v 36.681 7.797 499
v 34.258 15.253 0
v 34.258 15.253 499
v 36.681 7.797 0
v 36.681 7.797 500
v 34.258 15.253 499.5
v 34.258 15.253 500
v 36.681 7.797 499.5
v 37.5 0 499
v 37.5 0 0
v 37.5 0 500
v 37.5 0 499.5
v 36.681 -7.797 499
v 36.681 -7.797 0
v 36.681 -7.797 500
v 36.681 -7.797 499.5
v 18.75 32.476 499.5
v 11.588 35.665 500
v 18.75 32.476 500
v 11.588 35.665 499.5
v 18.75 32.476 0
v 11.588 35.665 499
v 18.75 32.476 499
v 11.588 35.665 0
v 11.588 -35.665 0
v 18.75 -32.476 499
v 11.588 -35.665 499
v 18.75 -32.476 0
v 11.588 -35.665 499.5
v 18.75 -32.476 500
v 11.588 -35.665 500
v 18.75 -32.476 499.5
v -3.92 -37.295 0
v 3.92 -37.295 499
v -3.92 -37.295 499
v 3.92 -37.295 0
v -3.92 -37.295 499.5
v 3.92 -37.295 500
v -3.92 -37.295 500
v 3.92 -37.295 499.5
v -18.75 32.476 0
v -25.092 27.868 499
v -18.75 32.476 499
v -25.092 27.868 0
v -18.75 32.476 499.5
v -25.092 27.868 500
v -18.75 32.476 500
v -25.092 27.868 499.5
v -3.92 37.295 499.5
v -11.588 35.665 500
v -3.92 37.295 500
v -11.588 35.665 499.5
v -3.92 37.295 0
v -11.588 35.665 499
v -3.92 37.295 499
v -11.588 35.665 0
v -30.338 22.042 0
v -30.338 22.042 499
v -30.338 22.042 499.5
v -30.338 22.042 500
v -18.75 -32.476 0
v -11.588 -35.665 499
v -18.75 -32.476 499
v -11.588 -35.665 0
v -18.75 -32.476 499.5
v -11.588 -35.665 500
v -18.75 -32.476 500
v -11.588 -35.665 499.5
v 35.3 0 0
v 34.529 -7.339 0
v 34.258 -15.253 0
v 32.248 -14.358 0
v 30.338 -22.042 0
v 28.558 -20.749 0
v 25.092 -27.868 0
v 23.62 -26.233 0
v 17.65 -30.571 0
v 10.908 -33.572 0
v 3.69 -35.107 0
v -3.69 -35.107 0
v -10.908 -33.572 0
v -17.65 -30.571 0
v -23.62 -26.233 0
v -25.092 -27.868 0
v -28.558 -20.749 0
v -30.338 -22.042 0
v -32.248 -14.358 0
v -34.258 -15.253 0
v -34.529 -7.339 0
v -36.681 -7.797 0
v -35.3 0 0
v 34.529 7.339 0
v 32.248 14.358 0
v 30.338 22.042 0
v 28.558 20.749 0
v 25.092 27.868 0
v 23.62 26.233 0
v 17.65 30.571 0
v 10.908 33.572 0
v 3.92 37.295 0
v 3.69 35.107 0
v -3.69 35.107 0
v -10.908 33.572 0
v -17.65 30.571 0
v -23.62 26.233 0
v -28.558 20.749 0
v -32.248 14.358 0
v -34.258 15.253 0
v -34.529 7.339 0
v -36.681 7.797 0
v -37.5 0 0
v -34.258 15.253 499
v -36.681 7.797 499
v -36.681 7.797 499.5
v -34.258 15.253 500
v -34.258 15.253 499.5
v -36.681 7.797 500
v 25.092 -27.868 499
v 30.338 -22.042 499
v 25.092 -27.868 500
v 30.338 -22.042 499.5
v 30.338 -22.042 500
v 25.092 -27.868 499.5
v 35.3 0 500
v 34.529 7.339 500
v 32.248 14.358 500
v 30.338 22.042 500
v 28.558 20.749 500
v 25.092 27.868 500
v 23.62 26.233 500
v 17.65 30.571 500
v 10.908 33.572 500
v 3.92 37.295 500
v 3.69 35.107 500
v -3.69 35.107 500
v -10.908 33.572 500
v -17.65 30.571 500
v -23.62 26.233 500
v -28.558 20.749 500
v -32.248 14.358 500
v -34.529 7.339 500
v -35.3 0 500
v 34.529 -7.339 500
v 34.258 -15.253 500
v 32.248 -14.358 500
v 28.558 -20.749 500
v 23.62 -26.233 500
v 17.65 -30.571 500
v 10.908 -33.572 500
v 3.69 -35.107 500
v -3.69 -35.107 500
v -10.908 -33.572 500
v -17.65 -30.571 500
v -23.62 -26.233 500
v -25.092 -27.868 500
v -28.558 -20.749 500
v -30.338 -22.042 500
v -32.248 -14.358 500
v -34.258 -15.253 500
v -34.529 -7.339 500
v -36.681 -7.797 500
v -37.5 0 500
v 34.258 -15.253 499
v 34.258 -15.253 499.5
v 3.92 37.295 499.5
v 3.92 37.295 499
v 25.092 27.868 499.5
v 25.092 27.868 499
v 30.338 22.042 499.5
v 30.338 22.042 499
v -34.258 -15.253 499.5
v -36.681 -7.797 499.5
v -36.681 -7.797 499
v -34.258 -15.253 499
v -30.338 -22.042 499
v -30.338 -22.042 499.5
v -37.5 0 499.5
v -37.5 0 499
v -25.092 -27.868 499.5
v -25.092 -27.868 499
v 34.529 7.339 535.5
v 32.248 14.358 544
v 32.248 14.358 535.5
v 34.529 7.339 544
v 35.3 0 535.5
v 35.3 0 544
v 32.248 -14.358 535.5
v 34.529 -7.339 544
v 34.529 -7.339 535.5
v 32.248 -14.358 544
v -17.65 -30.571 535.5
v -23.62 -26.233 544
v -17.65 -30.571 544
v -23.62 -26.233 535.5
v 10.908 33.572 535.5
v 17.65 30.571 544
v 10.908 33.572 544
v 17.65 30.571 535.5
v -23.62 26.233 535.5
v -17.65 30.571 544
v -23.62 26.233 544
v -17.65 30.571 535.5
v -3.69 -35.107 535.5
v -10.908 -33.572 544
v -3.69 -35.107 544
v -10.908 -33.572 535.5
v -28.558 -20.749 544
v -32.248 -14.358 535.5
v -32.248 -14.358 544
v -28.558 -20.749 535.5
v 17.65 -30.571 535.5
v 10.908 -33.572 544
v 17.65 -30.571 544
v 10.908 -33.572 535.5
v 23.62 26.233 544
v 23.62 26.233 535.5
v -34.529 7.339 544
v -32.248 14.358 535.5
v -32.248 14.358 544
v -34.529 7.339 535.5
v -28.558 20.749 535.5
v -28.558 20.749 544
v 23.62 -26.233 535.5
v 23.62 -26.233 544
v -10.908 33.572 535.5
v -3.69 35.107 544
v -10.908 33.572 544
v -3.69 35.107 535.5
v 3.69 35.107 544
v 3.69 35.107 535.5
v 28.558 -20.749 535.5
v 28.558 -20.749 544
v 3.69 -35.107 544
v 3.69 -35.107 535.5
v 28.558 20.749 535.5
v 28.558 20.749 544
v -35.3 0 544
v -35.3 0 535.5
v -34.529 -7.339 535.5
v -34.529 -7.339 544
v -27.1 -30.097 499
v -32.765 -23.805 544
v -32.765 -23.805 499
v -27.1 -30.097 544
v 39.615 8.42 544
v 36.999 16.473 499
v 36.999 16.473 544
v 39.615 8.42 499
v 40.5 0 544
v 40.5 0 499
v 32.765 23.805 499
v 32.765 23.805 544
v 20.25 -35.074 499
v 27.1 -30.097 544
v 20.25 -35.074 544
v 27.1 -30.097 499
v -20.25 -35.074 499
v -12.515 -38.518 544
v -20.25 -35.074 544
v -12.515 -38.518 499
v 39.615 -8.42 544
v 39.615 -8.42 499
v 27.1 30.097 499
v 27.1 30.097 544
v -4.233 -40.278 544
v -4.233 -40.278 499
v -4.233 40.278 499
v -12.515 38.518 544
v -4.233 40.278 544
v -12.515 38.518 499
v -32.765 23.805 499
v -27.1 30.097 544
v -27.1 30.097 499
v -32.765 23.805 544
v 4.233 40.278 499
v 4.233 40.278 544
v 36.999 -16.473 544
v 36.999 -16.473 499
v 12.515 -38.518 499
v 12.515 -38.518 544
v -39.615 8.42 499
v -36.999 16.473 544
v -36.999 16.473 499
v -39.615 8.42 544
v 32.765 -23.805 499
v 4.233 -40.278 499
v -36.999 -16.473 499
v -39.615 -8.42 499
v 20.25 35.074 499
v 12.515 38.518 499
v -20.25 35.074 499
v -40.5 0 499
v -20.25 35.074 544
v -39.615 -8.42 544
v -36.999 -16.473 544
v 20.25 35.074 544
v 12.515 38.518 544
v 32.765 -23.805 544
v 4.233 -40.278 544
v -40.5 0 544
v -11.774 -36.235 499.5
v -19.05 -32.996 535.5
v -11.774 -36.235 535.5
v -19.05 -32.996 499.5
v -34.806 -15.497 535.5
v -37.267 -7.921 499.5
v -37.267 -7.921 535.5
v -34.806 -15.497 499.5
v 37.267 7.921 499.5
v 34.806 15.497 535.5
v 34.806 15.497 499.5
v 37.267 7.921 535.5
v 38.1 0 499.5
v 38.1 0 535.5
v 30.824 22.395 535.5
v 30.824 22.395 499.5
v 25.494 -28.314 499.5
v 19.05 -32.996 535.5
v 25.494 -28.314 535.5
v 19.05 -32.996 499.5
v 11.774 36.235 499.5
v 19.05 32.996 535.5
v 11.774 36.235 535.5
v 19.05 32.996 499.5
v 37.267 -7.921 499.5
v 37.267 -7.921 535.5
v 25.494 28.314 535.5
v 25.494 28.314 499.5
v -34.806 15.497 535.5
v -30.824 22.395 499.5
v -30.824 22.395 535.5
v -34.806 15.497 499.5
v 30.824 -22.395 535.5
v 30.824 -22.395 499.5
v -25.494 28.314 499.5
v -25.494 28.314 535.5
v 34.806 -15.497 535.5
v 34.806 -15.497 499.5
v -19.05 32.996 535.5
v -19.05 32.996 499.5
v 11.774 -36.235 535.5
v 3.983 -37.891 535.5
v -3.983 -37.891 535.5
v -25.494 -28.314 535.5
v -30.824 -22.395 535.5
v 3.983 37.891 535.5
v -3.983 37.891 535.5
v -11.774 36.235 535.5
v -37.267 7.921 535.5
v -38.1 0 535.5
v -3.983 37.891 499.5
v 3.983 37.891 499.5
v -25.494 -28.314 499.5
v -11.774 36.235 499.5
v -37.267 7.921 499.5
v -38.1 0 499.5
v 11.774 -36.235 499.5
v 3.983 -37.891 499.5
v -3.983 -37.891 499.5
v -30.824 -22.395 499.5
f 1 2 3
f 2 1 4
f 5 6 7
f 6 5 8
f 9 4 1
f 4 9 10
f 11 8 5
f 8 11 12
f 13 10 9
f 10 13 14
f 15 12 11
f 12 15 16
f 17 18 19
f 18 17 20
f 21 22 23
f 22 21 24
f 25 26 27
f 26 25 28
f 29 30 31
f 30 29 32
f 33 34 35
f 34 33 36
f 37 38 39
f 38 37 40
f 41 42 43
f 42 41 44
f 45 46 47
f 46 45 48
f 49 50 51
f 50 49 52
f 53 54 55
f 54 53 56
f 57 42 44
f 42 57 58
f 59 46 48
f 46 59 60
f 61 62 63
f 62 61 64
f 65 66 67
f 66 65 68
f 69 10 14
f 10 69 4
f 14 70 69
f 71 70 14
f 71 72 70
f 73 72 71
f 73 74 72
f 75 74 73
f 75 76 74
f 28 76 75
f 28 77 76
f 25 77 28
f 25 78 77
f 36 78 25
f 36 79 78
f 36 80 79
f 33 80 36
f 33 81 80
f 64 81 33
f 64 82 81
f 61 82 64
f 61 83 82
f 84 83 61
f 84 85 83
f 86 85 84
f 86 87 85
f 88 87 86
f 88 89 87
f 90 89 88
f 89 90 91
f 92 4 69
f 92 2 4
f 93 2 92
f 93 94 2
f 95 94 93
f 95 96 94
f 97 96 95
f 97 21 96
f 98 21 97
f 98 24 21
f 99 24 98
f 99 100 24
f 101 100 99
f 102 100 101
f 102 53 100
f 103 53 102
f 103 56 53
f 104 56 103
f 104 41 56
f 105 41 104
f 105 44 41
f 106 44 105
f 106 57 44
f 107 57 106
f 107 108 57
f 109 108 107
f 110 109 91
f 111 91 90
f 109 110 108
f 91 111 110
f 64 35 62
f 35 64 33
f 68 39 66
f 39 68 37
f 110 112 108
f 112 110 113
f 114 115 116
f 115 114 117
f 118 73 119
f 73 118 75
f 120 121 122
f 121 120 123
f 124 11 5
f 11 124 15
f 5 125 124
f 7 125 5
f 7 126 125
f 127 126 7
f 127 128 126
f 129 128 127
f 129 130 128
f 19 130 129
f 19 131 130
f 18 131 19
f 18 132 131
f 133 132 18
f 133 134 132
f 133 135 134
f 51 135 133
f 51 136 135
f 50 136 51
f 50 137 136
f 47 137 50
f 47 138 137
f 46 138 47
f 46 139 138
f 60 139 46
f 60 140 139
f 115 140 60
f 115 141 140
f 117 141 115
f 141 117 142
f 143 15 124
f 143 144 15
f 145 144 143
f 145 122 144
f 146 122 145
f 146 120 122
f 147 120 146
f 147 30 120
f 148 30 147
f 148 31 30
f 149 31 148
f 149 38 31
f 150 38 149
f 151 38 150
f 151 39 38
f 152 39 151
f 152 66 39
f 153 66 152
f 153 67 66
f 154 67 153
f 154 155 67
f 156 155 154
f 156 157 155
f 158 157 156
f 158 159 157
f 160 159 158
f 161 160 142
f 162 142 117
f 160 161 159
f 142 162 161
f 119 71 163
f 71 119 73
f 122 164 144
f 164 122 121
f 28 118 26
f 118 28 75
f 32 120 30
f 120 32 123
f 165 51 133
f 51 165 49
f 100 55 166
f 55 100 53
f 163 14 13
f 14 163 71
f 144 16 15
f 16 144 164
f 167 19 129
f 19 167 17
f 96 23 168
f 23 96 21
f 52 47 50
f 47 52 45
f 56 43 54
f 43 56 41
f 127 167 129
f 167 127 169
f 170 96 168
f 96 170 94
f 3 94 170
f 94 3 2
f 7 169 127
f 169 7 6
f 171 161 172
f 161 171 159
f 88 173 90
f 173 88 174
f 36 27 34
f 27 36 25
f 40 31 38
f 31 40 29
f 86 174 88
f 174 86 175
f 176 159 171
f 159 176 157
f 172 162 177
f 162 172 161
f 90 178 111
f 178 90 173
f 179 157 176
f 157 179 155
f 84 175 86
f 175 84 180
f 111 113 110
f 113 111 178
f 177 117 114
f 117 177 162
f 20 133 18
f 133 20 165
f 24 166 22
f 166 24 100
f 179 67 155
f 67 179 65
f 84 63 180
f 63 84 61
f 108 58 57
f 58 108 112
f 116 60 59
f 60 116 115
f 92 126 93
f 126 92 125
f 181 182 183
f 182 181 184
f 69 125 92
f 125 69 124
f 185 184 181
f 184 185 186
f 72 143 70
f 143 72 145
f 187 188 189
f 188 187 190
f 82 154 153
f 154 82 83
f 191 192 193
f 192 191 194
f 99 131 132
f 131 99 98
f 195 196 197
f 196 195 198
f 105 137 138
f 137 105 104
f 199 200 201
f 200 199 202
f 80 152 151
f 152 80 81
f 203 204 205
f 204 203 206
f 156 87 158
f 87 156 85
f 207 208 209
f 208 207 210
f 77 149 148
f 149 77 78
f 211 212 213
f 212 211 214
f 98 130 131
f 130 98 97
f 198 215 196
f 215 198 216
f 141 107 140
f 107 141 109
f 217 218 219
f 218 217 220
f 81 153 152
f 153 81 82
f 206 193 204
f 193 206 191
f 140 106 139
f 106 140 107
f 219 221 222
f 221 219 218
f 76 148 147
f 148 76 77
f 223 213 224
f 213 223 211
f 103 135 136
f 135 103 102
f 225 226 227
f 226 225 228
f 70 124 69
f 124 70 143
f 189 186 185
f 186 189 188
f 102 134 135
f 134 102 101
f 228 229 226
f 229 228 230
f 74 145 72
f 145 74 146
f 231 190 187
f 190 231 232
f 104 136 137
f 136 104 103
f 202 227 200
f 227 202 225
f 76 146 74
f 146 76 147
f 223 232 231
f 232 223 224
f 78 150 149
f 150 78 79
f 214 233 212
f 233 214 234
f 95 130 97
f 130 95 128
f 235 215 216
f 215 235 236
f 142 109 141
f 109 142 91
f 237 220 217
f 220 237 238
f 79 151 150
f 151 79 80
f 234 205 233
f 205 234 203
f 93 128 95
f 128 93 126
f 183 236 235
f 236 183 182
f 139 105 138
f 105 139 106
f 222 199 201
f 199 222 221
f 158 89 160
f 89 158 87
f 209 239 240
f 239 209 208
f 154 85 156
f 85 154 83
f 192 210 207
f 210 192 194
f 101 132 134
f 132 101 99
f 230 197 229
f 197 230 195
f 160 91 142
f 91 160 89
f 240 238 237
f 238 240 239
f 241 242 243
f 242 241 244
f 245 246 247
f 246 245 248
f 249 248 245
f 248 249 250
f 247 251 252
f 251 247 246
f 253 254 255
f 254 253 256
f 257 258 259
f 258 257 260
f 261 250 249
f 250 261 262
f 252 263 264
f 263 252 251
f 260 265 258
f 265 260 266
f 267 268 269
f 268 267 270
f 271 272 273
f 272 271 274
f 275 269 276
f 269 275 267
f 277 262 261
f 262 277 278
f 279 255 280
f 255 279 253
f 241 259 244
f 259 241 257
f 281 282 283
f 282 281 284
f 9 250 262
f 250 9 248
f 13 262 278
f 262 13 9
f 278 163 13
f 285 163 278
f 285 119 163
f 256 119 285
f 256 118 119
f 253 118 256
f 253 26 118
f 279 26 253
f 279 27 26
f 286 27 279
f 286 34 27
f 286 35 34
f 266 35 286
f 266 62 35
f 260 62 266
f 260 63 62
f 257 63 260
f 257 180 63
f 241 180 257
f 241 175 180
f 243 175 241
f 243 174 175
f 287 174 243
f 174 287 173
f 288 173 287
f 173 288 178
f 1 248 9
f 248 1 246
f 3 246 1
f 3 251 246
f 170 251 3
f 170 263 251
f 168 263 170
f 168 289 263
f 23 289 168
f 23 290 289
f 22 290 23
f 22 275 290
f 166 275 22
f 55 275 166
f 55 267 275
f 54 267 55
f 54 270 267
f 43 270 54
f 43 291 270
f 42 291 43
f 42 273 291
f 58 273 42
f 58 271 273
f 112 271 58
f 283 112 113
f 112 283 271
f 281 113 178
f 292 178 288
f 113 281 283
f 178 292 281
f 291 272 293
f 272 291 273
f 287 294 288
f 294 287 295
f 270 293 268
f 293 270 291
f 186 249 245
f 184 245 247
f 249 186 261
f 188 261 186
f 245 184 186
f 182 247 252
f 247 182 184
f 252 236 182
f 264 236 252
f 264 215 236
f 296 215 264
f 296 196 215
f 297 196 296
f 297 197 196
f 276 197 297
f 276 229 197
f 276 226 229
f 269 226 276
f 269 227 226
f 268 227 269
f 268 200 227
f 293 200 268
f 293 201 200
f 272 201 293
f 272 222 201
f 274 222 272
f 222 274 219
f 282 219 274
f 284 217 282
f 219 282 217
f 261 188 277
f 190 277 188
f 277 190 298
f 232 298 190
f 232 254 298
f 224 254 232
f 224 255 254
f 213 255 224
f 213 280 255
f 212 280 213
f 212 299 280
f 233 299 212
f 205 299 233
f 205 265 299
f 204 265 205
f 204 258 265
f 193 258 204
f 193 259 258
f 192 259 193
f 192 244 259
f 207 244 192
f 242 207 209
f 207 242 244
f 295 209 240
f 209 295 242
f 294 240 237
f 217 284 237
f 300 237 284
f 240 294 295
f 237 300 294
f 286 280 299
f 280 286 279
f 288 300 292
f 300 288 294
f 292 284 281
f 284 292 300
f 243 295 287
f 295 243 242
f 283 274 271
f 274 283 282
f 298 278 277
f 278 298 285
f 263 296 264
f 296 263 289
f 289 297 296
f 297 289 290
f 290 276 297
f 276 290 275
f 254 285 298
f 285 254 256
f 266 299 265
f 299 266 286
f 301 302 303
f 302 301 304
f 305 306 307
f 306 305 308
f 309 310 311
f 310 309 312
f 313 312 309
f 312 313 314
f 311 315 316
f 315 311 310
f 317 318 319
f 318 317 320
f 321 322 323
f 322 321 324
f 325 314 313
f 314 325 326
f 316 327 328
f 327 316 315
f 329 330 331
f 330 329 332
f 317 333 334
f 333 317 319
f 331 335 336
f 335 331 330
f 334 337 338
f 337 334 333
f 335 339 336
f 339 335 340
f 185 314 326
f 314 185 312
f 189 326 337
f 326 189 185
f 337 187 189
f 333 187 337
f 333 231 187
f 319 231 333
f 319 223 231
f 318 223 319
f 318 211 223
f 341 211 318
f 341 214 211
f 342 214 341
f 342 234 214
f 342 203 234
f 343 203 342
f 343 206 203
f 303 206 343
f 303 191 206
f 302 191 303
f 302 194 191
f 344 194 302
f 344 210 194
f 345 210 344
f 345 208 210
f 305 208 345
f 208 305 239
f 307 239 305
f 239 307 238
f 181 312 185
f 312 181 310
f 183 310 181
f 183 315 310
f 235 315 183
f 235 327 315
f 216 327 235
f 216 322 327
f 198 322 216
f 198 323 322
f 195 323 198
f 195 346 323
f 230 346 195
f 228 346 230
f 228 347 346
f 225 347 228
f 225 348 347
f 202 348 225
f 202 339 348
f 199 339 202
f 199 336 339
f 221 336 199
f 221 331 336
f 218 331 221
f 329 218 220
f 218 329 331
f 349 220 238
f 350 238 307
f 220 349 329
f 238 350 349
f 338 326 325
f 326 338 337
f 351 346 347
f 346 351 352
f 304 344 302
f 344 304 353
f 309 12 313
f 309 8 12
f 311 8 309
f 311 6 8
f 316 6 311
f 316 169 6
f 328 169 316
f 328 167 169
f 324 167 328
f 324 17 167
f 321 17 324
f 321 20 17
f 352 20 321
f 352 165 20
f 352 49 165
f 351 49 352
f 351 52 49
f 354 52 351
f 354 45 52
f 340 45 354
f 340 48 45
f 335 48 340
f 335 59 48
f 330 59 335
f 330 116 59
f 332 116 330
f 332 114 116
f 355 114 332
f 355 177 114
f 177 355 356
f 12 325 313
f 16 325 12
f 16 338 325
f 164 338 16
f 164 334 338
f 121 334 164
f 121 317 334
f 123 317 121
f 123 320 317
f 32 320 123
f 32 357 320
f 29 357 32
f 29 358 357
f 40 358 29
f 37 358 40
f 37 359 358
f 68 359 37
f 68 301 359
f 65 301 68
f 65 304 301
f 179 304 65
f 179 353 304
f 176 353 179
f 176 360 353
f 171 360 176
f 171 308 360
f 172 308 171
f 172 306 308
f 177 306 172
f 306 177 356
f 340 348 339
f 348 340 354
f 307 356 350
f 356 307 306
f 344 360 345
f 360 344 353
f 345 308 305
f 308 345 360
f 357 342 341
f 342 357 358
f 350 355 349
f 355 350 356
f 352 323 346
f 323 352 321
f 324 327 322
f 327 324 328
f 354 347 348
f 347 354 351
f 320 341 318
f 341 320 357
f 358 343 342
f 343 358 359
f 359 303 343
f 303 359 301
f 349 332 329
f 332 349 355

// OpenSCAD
// Parameters
nominal_diameter_mm = 75; //[40:160:1]
length_mm = 500; //[250:1000:1]
ht75_outer_diameter_mm = 75; //[60:90:0.5]
wall_thickness_mm = 2.2; //[1.2:4.4:0.1]
fitting_length_mm = 45; //[25:90:1]
fitting_wall_extra_mm = 1.8; //[0.8:4:0.1]
fitting_od_extra_mm = 6; //[2:14:0.5]
socket_depth_mm = 35; //[15:70:1]
socket_clearance_mm = 0.6; //[0.2:1.5:0.1]
overlap_mm = 1; //[0.5:2:0.1]

// HT Pipe - complete geometry
module ht_pipe() {
  color([0.85, 0.85, 0.8]) { // PVC color
    // Pipe body
    difference() {
      cylinder(h=length_mm, r=ht75_outer_diameter_mm/2, center=false);
      translate([0, 0, -overlap_mm/2])
        cylinder(h=length_mm + overlap_mm, r=ht75_outer_diameter_mm/2 - wall_thickness_mm, center=false);
    }
    
    // End fitting
    difference() {
      union() {
        translate([0, 0, length_mm - overlap_mm])
          cylinder(h=fitting_length_mm, r=ht75_outer_diameter_mm/2 + fitting_od_extra_mm/2, center=false);
        cylinder(h=length_mm, r=ht75_outer_diameter_mm/2, center=false);
      }
      translate([0, 0, length_mm - overlap_mm/2])
        cylinder(h=socket_depth_mm + overlap_mm, r=ht75_outer_diameter_mm/2 + socket_clearance_mm, center=false);
      translate([0, 0, length_mm - overlap_mm])
        cylinder(h=fitting_length_mm + overlap_mm, r=ht75_outer_diameter_mm/2 - wall_thickness_mm, center=false);
      translate([0, 0, -overlap_mm/2])
        cylinder(h=length_mm + overlap_mm, r=ht75_outer_diameter_mm/2 - wall_thickness_mm, center=false);
    }
  }
}

// Assembly
module assembly() {
  ht_pipe();
}

assembly();
